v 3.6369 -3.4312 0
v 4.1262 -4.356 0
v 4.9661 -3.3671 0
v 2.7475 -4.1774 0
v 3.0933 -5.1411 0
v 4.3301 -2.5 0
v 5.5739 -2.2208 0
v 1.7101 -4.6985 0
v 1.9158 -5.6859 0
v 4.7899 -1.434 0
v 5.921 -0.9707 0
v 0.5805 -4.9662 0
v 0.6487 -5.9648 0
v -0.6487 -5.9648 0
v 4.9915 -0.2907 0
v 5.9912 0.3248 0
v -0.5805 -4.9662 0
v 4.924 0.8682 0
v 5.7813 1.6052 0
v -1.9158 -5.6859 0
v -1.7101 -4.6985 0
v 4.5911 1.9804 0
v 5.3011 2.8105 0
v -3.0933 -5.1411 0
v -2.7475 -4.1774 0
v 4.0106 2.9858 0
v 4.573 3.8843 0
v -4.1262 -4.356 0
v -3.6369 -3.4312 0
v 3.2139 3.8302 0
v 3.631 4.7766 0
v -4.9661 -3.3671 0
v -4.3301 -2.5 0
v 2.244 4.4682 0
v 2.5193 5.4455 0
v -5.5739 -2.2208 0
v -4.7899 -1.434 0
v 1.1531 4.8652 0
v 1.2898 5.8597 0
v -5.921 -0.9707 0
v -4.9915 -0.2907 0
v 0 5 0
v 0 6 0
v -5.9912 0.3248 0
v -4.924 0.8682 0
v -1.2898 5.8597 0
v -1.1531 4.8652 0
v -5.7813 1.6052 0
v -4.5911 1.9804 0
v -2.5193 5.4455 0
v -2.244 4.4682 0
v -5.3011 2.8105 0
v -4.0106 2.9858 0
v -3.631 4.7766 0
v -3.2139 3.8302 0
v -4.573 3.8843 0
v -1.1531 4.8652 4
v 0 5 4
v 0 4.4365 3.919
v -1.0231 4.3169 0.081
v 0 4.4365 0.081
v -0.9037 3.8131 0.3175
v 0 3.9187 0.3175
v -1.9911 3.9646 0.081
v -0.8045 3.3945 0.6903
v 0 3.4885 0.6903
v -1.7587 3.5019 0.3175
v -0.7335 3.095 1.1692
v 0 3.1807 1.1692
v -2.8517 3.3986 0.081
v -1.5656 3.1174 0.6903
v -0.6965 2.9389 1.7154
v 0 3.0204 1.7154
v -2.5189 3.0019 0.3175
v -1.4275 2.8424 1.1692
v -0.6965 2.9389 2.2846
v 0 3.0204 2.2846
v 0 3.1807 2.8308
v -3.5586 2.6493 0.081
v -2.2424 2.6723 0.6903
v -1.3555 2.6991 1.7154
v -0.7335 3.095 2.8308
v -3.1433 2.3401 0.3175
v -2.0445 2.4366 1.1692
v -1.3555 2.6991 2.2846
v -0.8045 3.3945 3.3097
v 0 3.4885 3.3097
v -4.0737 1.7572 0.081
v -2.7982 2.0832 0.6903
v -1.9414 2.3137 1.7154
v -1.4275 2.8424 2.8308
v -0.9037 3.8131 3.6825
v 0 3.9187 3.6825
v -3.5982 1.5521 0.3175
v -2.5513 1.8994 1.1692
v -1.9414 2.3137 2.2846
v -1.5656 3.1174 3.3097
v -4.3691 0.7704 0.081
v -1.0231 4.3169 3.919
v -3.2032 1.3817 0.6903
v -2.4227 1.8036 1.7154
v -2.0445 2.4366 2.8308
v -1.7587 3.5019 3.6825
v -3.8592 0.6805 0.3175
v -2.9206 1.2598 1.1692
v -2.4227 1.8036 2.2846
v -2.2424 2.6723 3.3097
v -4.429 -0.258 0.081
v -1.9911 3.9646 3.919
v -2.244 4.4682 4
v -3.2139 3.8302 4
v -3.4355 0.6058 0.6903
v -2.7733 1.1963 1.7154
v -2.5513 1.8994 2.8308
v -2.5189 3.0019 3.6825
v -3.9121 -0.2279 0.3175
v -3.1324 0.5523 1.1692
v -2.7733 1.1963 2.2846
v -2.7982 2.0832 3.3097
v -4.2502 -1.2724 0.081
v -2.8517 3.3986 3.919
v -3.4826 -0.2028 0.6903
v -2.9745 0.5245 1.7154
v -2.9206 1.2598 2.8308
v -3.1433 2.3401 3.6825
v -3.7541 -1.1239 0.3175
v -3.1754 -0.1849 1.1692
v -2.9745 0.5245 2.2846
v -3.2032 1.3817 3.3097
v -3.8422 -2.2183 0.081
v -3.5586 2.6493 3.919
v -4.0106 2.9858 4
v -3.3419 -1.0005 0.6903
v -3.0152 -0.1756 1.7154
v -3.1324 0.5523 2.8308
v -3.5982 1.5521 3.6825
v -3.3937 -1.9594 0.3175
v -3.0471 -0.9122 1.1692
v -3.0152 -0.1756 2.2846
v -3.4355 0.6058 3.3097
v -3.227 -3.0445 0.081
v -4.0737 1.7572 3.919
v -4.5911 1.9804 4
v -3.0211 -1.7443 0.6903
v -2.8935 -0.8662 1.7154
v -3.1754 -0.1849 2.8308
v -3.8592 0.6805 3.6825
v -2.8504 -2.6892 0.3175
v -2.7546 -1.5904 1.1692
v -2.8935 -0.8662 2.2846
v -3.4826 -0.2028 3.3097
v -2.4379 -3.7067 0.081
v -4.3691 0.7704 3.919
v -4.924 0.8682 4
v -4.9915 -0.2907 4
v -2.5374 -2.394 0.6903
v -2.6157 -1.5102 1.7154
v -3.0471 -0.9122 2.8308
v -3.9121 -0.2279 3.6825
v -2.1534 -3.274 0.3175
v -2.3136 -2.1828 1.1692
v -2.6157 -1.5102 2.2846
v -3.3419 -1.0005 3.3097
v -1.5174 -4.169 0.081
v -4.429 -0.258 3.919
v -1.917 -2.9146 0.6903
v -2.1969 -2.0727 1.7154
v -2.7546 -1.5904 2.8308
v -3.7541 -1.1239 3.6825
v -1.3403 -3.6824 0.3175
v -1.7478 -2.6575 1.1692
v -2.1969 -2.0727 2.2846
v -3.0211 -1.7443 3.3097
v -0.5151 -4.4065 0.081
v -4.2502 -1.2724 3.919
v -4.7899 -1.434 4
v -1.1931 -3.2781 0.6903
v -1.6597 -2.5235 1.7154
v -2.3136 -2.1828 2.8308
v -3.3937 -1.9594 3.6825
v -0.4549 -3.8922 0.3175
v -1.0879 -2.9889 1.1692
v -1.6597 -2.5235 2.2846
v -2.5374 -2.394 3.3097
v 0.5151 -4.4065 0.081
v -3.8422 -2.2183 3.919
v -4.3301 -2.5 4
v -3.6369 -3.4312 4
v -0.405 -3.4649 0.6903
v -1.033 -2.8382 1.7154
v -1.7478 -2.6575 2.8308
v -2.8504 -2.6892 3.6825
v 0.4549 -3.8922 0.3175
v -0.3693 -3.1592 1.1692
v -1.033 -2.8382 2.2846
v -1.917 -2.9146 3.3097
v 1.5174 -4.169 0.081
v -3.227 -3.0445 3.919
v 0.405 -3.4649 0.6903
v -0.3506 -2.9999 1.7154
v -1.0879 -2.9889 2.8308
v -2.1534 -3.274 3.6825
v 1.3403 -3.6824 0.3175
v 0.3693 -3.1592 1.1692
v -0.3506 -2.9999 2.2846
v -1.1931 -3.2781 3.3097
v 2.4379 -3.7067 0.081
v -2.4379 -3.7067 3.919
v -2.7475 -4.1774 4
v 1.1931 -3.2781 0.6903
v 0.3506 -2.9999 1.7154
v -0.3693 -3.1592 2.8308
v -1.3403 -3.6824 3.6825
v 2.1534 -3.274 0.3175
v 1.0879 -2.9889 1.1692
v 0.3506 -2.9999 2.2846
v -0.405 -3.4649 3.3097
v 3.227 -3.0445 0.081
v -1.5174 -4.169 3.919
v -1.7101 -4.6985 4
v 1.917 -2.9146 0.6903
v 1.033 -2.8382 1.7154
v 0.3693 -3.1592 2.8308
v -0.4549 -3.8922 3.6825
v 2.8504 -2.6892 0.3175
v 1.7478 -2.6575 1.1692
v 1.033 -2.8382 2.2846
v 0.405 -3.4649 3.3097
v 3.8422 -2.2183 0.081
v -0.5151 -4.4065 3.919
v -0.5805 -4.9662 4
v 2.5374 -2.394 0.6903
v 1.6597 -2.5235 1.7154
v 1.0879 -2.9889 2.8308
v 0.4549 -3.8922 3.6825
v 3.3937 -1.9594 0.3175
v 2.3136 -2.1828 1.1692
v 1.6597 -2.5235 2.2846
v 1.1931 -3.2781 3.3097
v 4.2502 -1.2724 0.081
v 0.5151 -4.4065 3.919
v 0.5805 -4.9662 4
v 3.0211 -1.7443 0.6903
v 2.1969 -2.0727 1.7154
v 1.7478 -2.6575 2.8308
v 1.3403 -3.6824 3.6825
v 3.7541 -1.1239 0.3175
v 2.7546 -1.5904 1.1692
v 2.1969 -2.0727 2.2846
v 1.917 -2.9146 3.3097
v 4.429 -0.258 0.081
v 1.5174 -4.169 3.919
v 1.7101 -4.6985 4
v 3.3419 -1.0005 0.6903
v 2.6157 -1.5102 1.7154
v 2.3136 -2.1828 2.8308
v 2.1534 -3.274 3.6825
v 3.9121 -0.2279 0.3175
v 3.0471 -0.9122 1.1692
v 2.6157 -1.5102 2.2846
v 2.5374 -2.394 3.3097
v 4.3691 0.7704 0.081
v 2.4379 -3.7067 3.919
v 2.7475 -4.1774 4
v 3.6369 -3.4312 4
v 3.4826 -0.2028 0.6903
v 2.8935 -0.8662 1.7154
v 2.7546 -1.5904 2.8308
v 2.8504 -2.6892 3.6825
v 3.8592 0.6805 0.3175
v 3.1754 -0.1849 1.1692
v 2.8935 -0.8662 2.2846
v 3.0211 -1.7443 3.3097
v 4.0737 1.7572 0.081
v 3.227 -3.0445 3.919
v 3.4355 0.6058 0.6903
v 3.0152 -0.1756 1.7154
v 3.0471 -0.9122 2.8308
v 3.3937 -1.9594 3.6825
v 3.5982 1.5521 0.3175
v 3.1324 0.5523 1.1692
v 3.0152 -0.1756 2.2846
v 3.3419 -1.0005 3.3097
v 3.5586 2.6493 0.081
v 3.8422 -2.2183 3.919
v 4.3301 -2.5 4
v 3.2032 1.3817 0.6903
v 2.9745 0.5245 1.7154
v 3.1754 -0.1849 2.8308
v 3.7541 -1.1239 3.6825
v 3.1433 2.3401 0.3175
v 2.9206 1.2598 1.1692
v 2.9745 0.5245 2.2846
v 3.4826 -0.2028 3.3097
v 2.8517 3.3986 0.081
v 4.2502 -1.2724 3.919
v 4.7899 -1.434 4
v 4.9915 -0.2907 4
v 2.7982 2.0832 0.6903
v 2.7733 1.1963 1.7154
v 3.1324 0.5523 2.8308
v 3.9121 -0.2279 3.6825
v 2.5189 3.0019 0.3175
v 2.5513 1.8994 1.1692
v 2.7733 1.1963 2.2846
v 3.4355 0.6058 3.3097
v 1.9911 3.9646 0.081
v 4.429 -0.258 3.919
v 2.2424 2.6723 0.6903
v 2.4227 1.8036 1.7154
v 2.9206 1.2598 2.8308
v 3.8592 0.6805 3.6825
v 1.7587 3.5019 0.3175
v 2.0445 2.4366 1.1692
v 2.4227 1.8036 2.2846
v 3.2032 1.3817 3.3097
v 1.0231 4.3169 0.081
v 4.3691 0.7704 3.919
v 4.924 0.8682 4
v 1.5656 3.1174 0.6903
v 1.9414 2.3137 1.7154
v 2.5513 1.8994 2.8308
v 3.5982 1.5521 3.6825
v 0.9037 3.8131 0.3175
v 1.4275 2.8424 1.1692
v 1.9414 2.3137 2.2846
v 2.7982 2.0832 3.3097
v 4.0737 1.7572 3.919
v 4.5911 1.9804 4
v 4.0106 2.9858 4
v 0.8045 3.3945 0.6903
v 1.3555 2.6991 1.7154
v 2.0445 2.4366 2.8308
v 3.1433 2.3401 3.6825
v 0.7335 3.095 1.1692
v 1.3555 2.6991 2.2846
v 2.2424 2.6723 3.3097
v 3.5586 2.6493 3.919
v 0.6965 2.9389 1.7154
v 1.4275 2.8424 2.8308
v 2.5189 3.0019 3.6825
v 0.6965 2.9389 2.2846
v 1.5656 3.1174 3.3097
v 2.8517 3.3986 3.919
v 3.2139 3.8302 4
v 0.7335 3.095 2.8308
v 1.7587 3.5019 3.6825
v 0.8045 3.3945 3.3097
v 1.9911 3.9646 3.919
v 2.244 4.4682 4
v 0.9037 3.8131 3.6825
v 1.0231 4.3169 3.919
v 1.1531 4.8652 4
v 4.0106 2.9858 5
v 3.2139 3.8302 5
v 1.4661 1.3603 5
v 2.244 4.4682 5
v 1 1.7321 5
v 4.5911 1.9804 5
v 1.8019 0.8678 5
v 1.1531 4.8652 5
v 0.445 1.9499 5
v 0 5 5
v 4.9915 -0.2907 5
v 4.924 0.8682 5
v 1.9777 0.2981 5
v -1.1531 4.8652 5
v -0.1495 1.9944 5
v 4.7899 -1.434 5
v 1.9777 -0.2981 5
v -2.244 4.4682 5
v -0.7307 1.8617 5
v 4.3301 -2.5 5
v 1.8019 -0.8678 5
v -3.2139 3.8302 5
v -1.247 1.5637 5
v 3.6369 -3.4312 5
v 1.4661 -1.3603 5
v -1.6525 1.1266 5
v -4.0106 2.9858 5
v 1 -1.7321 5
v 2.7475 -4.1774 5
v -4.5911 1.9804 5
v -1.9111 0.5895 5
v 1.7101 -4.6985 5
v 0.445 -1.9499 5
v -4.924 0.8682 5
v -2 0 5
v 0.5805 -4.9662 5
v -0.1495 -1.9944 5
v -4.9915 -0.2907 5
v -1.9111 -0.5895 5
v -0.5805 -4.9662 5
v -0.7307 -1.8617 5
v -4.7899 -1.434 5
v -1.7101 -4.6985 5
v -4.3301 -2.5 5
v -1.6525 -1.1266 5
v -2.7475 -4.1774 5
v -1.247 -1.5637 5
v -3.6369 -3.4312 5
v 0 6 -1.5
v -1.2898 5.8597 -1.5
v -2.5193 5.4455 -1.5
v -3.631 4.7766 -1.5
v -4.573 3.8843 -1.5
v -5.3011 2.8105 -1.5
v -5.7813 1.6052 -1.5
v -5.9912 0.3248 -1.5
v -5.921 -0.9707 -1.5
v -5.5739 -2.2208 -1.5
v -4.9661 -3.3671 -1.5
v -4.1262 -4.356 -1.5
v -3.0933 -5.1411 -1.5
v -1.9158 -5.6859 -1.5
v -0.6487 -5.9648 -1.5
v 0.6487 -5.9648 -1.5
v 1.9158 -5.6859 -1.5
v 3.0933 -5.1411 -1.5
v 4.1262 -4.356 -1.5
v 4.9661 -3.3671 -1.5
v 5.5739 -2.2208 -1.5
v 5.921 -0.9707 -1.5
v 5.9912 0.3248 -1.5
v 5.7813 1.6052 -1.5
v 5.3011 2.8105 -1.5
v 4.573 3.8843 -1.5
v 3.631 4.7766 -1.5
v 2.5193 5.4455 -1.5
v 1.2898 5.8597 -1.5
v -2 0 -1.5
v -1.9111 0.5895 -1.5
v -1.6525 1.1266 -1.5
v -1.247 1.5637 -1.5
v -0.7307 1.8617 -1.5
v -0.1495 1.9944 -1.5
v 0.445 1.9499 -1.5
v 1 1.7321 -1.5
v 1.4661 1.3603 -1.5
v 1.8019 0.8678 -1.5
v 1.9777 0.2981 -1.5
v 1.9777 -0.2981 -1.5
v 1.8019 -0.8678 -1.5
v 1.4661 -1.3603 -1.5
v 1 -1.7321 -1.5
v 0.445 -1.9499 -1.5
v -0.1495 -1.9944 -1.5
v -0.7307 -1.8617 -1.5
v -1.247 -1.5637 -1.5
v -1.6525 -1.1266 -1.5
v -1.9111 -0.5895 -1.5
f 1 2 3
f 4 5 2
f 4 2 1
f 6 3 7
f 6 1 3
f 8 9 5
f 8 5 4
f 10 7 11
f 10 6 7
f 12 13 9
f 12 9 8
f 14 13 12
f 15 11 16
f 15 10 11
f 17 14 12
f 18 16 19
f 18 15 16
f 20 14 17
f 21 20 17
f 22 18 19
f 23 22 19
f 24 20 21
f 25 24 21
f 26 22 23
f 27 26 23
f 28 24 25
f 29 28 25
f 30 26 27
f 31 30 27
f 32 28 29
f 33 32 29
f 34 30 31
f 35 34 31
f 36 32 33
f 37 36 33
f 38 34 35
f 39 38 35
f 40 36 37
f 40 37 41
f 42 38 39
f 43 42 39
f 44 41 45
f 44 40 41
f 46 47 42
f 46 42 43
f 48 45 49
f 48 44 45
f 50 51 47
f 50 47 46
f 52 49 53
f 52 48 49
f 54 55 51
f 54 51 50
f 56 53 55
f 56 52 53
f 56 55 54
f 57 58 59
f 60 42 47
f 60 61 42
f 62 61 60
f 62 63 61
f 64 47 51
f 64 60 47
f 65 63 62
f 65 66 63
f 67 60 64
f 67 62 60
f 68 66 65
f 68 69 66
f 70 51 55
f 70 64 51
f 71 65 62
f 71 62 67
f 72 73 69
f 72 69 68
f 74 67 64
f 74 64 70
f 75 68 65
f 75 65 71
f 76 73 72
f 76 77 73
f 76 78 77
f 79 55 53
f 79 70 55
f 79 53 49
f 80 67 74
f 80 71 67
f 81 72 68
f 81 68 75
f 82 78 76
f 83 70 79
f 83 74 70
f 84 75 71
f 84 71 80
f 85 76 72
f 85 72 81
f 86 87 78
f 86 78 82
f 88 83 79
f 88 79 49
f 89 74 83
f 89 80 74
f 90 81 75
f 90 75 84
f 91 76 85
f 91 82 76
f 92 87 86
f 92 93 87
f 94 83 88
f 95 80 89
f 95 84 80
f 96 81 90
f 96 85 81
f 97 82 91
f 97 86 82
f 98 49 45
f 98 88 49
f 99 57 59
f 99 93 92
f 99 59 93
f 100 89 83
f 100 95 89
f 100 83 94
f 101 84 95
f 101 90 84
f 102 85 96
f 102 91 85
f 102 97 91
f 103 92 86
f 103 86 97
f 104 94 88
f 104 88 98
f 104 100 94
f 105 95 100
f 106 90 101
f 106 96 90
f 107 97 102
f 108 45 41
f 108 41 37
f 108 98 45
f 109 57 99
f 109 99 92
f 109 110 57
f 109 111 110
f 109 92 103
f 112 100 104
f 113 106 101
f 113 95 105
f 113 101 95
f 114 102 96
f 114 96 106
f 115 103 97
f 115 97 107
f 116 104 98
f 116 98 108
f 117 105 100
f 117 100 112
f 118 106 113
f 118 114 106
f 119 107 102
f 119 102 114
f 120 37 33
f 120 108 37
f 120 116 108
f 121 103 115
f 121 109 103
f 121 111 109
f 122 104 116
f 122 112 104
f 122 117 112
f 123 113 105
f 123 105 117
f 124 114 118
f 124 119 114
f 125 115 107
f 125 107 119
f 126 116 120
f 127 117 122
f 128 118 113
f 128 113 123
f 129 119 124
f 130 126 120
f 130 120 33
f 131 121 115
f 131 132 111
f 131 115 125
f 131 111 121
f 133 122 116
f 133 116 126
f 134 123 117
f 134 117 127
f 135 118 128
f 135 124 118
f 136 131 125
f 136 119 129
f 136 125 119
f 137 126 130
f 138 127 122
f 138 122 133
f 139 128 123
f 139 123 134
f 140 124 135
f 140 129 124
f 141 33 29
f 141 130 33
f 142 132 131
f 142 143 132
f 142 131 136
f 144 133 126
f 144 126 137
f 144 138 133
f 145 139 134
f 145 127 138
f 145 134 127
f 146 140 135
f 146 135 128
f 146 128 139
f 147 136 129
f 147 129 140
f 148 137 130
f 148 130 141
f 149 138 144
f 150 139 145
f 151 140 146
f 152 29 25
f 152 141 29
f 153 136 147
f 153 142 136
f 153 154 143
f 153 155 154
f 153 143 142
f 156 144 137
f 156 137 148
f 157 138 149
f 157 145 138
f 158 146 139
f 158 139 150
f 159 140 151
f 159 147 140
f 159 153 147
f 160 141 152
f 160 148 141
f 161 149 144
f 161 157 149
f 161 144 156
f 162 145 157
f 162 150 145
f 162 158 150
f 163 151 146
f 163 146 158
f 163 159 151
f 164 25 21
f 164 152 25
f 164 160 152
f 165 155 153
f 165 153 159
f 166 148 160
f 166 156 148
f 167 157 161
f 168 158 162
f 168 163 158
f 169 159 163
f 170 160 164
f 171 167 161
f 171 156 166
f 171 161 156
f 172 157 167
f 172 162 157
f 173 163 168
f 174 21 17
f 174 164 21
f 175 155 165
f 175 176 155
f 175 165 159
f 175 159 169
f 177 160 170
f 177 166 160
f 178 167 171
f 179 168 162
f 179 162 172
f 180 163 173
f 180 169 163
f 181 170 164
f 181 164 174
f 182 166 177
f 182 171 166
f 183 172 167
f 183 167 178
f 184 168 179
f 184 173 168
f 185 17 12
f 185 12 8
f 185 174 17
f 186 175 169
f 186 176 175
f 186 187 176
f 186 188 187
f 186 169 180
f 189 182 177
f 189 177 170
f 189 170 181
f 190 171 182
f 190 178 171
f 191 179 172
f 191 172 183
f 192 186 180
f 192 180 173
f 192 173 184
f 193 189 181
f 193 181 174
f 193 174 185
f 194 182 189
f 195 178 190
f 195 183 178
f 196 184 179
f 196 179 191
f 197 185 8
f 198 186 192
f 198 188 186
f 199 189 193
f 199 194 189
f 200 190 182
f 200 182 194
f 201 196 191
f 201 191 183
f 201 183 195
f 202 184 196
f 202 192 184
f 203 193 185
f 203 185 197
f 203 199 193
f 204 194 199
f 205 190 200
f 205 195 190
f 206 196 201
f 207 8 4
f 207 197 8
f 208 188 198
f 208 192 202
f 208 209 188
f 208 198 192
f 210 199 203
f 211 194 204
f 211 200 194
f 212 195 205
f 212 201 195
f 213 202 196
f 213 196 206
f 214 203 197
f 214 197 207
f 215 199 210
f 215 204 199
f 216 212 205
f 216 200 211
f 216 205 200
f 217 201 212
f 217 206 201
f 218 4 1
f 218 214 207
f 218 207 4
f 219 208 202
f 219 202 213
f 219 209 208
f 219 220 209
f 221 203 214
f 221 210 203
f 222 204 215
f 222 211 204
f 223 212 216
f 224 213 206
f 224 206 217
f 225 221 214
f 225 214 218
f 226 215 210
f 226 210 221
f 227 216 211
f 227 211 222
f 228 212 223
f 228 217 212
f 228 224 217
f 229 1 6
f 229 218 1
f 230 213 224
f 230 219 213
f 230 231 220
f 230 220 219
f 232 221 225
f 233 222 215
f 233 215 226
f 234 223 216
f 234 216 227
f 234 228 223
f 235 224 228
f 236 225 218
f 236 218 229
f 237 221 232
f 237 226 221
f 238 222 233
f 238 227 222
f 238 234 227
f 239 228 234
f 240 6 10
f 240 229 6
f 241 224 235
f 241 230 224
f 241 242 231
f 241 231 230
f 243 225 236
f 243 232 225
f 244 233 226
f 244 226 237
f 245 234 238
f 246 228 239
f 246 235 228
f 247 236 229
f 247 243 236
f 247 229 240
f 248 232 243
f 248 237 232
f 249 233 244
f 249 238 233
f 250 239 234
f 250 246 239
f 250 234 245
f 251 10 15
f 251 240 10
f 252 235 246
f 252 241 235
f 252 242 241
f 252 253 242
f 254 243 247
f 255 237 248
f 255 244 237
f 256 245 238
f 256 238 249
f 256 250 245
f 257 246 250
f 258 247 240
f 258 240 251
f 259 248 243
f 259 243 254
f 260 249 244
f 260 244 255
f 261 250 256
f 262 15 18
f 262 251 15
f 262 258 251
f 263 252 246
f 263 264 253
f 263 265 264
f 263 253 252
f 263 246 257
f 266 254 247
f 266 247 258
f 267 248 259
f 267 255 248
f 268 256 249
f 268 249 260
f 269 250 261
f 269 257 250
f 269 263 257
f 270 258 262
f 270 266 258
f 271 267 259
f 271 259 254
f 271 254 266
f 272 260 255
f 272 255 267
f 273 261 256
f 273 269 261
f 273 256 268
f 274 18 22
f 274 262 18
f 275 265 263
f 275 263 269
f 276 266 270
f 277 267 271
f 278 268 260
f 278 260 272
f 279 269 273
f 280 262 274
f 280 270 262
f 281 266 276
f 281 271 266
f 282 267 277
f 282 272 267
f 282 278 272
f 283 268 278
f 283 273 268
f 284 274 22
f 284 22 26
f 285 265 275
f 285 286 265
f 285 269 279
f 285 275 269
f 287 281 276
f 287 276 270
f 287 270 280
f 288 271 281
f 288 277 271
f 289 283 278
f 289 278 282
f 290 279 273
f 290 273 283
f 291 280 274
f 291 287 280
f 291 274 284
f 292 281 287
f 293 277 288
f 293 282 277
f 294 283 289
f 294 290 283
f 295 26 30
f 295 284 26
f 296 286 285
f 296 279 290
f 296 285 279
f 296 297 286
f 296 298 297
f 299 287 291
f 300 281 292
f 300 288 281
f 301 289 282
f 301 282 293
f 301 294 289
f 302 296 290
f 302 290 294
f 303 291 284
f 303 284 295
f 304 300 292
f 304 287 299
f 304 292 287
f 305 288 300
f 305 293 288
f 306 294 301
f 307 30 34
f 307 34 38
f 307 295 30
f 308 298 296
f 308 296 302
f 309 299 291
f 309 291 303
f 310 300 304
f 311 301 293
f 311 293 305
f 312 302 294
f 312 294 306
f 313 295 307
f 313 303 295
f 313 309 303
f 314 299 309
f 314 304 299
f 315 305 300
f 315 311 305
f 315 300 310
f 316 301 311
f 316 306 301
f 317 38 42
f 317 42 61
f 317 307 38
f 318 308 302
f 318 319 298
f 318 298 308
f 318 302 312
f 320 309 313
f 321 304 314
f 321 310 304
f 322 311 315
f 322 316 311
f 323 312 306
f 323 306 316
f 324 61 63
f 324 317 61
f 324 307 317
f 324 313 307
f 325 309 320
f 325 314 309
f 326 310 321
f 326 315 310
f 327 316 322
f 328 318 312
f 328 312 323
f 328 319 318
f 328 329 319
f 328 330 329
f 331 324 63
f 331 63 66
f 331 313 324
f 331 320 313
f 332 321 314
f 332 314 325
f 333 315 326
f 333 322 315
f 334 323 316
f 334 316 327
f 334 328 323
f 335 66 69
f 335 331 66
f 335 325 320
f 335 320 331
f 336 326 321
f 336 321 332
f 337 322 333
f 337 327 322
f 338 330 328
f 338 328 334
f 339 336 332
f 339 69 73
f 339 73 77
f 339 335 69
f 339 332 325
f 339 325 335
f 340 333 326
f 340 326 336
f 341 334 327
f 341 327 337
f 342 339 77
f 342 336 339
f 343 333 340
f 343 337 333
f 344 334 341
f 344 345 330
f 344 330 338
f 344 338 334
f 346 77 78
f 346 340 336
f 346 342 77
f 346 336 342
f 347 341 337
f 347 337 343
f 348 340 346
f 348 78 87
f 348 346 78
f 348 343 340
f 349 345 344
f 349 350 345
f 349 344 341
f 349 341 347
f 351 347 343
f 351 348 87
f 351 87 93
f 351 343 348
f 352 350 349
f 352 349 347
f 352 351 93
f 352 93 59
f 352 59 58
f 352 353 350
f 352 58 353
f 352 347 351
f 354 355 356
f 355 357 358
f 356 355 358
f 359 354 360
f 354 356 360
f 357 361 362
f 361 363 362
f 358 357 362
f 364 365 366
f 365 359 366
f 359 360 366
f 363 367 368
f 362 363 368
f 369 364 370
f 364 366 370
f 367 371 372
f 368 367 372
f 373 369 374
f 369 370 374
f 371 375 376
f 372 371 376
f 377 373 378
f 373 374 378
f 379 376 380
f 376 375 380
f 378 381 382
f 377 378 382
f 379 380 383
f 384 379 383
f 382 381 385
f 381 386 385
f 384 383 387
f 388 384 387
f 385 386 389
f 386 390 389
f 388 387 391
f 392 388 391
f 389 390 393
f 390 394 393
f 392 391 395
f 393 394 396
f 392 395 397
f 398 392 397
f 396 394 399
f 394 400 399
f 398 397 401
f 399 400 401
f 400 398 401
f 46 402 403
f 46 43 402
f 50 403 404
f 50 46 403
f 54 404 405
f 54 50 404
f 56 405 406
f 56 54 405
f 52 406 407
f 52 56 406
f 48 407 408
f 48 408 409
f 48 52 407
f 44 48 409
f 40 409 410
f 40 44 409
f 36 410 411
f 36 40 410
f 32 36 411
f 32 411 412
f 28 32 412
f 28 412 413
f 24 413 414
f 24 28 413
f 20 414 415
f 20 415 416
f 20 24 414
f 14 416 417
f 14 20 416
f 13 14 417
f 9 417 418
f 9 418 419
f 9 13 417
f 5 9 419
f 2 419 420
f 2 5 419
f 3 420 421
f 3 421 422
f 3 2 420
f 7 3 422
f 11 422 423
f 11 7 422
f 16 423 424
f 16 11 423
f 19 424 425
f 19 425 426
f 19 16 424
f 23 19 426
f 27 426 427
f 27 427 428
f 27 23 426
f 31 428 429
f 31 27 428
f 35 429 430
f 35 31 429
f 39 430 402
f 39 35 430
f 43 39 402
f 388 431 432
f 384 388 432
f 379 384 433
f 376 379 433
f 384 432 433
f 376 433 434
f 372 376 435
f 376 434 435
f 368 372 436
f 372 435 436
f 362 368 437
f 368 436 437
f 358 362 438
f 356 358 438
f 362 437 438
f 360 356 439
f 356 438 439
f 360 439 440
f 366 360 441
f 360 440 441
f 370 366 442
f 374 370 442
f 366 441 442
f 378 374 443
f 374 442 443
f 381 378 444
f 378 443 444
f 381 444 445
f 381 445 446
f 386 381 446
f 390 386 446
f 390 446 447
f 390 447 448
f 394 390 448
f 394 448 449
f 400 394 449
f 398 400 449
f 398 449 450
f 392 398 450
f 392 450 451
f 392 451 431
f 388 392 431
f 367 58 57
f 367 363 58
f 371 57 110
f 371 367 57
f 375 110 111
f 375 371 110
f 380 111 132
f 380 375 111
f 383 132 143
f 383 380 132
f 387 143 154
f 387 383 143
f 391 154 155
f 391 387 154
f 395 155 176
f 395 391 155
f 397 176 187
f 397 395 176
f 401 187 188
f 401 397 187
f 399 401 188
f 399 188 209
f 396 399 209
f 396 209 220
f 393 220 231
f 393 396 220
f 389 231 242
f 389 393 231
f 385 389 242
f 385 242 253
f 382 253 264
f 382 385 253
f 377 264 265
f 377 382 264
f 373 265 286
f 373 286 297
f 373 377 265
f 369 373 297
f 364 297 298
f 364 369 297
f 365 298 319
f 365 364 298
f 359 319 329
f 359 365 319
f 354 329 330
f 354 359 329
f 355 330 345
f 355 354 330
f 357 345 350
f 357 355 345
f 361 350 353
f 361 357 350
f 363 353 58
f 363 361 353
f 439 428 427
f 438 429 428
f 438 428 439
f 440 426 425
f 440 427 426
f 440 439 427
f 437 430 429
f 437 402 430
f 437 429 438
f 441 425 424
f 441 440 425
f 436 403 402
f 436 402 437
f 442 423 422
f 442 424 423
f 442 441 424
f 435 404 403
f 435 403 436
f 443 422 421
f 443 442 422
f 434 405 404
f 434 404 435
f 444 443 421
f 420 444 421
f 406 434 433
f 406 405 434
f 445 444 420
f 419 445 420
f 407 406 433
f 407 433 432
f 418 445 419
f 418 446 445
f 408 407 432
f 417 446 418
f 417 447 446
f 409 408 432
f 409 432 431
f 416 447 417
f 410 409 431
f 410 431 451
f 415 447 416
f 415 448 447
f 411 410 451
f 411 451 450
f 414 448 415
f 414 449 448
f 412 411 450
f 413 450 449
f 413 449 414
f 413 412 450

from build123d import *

# Parameters (mm, degrees)
F0_W = 5
F0_H = 1
F3_D = 4


with BuildPart() as f1:
    # F0 (on Right) → F1 (revolve)
    with BuildSketch(Plane.YZ):
        Polygon((5, 0), (0, 0), (0, -1.5), (6, -1.5), (6, 0), align=None)
        with BuildLine():
            Line((0, 4), (0, 0))
            Line((0, 0), (5, 0))
            ThreePointArc((5, 0), (3, 2), (5, 4))
            Line((5, 4), (0, 4))
        make_face()
        with Locations((2.5, 4.5)):
            Rectangle(F0_W, F0_H)
    revolve(axis=Axis((0, 0, 2), (0, 0, 1)))

    # F3 (through all)
    with Locations(Plane.XY.offset(5)):
        with Locations((0, 0)):
            Hole(F3_D / 2)


solid = f1.part
